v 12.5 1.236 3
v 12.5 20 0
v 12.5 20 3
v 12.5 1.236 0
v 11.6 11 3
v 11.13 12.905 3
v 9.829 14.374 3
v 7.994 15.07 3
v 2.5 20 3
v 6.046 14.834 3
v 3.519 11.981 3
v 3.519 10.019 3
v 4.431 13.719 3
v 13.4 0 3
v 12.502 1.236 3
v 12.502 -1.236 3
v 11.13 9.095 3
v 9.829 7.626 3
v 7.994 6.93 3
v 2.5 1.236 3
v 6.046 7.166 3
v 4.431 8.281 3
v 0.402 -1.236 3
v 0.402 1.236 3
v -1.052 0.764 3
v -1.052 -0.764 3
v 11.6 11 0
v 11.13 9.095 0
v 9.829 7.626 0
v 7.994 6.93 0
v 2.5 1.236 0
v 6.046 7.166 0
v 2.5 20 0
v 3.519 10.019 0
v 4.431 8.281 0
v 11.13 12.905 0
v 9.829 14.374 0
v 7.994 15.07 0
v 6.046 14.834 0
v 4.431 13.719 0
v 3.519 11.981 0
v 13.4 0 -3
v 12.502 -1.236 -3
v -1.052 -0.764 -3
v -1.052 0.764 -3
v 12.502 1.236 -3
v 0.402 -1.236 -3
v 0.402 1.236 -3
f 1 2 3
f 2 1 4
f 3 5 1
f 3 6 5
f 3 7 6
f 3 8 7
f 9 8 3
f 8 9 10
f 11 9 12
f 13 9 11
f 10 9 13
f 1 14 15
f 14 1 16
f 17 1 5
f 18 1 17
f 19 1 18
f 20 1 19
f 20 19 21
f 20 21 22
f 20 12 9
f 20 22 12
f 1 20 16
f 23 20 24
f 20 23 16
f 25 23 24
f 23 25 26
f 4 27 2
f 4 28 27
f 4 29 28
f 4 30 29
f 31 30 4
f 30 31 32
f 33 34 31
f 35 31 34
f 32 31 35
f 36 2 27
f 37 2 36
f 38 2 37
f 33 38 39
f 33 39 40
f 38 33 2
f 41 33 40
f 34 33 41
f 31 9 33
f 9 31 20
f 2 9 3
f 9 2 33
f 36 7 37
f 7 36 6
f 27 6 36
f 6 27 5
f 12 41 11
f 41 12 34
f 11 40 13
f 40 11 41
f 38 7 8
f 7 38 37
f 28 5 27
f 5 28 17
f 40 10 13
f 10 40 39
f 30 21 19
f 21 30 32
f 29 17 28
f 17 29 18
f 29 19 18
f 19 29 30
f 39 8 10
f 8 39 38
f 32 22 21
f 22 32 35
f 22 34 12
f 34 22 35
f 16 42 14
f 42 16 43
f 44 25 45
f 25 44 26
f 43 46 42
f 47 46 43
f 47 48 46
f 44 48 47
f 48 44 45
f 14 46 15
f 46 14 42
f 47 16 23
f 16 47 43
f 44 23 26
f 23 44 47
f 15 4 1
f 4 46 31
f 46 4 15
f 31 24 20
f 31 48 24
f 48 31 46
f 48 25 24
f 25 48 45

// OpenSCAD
//$fn = 300;

PiSupportH = 10;
PiSupportD = 8;

PiSupportScrew = 3;
tolerance = 0.2;

module PiStud(){
difference(){
    
cylinder(d = PiSupportD, h = PiSupportH , center = true);
cylinder(d = PiSupportScrew+tolerance,h = PiSupportH , center = true);
   
}
}


module PiSupport2(){
        linear_extrude(height = 6, center = true, convexity = 10, twist = 0, slices = 20, scale = 1.0) hull(){circle(r=3/2-tolerance, center = true); translate([15.5-3-2*tolerance,0,0])   circle(r=3/2-tolerance,center = true);}
translate([15.5-10-3,0,0])difference(){

cube([10,20,3]);

translate([5,11,+PiSupportH/2])cylinder(d = PiSupportD+tolerance, h = PiSupportH , center = true);
}

}
PiSupport2();
